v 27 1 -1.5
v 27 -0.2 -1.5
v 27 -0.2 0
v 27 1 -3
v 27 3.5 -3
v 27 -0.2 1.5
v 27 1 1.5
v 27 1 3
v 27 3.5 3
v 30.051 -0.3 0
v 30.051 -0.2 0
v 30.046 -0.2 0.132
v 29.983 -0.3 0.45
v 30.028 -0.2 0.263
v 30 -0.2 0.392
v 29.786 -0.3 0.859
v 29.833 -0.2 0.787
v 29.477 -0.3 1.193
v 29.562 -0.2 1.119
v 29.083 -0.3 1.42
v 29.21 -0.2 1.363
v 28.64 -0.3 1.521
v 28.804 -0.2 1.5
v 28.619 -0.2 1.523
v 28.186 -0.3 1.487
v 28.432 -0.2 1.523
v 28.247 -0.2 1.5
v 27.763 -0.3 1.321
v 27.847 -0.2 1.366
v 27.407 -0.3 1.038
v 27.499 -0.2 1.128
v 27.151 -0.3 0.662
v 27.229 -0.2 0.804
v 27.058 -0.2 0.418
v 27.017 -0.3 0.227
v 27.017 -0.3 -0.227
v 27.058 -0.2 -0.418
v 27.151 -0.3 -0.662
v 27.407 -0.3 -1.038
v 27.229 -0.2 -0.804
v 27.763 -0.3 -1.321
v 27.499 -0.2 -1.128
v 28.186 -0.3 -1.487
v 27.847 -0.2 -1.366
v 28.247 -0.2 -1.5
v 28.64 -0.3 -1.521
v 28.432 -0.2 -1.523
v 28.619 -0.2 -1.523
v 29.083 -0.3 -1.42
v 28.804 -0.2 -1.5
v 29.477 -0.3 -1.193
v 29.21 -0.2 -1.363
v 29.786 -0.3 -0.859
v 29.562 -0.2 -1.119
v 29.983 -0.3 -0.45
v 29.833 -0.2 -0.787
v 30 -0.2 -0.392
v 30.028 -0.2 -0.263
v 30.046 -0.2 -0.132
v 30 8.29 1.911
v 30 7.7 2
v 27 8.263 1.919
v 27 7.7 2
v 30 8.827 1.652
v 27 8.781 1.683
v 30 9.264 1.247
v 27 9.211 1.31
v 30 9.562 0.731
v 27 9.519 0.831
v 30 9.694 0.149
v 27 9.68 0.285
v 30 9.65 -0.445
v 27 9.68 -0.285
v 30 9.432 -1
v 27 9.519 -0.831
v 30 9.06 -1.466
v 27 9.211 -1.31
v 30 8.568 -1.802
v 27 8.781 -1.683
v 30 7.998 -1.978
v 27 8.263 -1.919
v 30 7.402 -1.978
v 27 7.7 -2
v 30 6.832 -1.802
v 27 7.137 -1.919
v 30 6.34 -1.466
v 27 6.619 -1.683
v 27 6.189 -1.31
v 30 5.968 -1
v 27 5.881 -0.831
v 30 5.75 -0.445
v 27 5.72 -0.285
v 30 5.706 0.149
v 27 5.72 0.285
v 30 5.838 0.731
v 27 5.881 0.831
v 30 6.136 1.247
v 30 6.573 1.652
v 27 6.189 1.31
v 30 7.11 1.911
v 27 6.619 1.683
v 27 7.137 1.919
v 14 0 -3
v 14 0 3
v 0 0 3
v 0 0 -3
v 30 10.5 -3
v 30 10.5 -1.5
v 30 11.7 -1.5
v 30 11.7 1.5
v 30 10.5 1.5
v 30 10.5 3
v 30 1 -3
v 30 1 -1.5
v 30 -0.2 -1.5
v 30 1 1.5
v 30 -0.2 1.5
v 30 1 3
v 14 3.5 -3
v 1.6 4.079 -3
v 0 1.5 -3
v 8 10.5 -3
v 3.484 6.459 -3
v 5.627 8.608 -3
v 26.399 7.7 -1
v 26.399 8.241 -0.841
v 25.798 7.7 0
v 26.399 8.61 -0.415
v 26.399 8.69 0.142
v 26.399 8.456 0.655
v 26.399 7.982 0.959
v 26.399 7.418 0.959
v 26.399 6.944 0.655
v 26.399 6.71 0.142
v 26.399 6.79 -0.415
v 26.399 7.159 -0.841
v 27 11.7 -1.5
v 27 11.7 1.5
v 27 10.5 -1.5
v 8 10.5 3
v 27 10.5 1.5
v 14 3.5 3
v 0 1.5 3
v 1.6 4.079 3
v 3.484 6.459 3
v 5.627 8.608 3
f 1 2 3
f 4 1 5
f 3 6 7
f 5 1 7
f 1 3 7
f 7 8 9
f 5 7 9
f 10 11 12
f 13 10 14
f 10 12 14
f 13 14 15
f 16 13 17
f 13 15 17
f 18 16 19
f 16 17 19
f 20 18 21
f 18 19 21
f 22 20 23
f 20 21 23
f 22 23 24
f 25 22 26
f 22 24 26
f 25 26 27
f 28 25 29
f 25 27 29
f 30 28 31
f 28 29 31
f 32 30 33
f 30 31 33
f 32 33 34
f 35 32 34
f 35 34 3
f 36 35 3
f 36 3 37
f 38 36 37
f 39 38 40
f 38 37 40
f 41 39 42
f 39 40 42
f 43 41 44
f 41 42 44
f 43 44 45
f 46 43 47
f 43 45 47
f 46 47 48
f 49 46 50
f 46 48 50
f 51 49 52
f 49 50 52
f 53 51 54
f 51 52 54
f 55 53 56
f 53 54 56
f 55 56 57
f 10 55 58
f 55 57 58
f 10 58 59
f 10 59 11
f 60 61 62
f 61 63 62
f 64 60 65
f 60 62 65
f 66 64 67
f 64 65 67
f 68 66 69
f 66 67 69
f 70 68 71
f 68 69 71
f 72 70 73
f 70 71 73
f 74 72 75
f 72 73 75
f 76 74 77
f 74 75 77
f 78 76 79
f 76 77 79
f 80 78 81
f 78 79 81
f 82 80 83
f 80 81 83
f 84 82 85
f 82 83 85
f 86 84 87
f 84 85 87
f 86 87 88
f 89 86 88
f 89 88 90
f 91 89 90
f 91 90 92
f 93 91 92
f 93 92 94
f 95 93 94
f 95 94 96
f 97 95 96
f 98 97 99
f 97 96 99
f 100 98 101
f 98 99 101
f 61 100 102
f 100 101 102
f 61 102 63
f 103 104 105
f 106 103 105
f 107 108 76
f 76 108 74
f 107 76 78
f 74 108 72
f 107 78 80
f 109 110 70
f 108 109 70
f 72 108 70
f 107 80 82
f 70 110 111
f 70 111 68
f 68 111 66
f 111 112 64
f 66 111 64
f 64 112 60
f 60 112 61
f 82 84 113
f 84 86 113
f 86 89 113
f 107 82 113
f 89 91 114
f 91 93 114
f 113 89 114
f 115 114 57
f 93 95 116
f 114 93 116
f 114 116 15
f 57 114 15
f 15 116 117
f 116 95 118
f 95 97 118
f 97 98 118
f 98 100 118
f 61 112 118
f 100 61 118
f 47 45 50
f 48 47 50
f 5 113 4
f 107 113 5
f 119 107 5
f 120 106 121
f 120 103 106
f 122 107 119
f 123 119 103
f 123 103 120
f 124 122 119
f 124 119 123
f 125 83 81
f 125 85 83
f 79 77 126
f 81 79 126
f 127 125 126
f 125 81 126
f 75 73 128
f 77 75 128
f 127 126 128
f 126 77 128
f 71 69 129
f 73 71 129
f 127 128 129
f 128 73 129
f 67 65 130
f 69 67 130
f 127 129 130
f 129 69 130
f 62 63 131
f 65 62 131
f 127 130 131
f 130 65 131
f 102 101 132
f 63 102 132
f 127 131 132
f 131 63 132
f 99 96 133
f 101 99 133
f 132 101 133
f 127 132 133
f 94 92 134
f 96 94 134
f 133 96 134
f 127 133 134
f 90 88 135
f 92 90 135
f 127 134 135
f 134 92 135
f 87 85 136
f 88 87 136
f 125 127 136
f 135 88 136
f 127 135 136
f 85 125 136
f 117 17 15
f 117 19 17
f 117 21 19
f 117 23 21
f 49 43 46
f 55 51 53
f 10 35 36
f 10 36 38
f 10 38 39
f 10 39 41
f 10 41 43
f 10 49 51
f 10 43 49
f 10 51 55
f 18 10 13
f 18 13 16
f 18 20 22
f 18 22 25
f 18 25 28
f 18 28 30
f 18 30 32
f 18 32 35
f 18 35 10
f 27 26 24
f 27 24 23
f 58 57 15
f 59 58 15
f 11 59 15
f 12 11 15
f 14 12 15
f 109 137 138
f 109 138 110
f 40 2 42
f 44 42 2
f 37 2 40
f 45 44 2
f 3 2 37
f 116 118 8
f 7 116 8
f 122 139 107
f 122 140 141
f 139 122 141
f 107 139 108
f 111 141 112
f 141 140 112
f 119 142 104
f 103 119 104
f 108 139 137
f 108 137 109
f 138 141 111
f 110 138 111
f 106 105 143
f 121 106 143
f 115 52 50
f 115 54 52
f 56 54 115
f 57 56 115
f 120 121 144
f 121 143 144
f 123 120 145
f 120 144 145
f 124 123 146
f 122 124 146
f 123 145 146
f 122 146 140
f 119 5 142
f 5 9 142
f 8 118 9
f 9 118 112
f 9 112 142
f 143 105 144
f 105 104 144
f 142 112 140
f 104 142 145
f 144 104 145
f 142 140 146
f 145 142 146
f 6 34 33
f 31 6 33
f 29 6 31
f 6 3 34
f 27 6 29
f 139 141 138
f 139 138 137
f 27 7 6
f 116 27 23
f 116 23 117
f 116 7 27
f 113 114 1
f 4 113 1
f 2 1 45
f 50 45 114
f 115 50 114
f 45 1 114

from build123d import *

# Parameters (mm, degrees)
EXTRUSION1_DEPTH                  = 3
ESQUISSE2_W                       = 3
ESQUISSE2_H                       = 3
EXTRUSION2_DEPTH                  = 1.2
ESQUISSE3_W                       = 3
ESQUISSE3_H                       = 3
EXTRUSION3_DEPTH                  = 1.2
DIAM_TRE_DU_PER_AGE_4_0_4_1_D     = 4
DIAM_TRE_DU_PER_AGE_4_0_4_1_DEPTH = 3
DIAM_TRE_DU_PER_AGE_4_0_4_1_TIP   = 1.201721238
ESQUISSE6_R                       = 1.525615423
EXTRUSION4_DEPTH                  = 0.1


with BuildPart() as part:
    # Esquisse1 → Extrusion1 (new body, symmetric)
    with BuildSketch(Plane.XY):
        with BuildLine():
            Line((0, 0), (0, 1.5))
            ThreePointArc((0, 1.5), (3.484063784, 6.45860997), (8, 10.5))
            Line((8, 10.5), (30, 10.5))
            Line((30, 10.5), (30, 1))
            Line((30, 1), (27, 1))
            Line((27, 1), (27, 3.5))
            Line((27, 3.5), (14, 3.5))
            Line((14, 3.5), (14, 0))
            Line((14, 0), (0, 0))
        make_face()
    extrude(amount=EXTRUSION1_DEPTH, both=True)

    # Esquisse2 → Extrusion2 (add)
    with BuildSketch(Plane(origin=(0, 10.5, 0), x_dir=(1, 0, 0), z_dir=(0, 1, 0))):
        with Locations((28.5, 0)):
            Rectangle(ESQUISSE2_W, ESQUISSE2_H)
    extrude(amount=EXTRUSION2_DEPTH)

    # Esquisse3 → Extrusion3 (add)
    with BuildSketch(Plane.XZ.offset(-1)):
        with Locations((28.5, 0)):
            Rectangle(ESQUISSE3_W, ESQUISSE3_H)
    extrude(amount=EXTRUSION3_DEPTH)

    # Diamètre du perçage Ø4.0 (4)1
    with Locations(Plane(origin=(30, 0, 0), x_dir=(0, 0, -1), z_dir=(1, 0, 0))):
        with Locations((0, 7.7)):
            Hole(DIAM_TRE_DU_PER_AGE_4_0_4_1_D / 2, depth=DIAM_TRE_DU_PER_AGE_4_0_4_1_DEPTH)
            with Locations((0, 0, -(DIAM_TRE_DU_PER_AGE_4_0_4_1_DEPTH + DIAM_TRE_DU_PER_AGE_4_0_4_1_TIP / 2))):  # 118° drill point
                Cone(0, DIAM_TRE_DU_PER_AGE_4_0_4_1_D / 2, DIAM_TRE_DU_PER_AGE_4_0_4_1_TIP, mode=Mode.SUBTRACT)

    # Esquisse6 → Extrusion4 (add)
    with BuildSketch(Plane.XZ.offset(0.2)):
        with Locations((28.525615423, 0)):
            Circle(ESQUISSE6_R)
    extrude(amount=EXTRUSION4_DEPTH)


solid = part.part
